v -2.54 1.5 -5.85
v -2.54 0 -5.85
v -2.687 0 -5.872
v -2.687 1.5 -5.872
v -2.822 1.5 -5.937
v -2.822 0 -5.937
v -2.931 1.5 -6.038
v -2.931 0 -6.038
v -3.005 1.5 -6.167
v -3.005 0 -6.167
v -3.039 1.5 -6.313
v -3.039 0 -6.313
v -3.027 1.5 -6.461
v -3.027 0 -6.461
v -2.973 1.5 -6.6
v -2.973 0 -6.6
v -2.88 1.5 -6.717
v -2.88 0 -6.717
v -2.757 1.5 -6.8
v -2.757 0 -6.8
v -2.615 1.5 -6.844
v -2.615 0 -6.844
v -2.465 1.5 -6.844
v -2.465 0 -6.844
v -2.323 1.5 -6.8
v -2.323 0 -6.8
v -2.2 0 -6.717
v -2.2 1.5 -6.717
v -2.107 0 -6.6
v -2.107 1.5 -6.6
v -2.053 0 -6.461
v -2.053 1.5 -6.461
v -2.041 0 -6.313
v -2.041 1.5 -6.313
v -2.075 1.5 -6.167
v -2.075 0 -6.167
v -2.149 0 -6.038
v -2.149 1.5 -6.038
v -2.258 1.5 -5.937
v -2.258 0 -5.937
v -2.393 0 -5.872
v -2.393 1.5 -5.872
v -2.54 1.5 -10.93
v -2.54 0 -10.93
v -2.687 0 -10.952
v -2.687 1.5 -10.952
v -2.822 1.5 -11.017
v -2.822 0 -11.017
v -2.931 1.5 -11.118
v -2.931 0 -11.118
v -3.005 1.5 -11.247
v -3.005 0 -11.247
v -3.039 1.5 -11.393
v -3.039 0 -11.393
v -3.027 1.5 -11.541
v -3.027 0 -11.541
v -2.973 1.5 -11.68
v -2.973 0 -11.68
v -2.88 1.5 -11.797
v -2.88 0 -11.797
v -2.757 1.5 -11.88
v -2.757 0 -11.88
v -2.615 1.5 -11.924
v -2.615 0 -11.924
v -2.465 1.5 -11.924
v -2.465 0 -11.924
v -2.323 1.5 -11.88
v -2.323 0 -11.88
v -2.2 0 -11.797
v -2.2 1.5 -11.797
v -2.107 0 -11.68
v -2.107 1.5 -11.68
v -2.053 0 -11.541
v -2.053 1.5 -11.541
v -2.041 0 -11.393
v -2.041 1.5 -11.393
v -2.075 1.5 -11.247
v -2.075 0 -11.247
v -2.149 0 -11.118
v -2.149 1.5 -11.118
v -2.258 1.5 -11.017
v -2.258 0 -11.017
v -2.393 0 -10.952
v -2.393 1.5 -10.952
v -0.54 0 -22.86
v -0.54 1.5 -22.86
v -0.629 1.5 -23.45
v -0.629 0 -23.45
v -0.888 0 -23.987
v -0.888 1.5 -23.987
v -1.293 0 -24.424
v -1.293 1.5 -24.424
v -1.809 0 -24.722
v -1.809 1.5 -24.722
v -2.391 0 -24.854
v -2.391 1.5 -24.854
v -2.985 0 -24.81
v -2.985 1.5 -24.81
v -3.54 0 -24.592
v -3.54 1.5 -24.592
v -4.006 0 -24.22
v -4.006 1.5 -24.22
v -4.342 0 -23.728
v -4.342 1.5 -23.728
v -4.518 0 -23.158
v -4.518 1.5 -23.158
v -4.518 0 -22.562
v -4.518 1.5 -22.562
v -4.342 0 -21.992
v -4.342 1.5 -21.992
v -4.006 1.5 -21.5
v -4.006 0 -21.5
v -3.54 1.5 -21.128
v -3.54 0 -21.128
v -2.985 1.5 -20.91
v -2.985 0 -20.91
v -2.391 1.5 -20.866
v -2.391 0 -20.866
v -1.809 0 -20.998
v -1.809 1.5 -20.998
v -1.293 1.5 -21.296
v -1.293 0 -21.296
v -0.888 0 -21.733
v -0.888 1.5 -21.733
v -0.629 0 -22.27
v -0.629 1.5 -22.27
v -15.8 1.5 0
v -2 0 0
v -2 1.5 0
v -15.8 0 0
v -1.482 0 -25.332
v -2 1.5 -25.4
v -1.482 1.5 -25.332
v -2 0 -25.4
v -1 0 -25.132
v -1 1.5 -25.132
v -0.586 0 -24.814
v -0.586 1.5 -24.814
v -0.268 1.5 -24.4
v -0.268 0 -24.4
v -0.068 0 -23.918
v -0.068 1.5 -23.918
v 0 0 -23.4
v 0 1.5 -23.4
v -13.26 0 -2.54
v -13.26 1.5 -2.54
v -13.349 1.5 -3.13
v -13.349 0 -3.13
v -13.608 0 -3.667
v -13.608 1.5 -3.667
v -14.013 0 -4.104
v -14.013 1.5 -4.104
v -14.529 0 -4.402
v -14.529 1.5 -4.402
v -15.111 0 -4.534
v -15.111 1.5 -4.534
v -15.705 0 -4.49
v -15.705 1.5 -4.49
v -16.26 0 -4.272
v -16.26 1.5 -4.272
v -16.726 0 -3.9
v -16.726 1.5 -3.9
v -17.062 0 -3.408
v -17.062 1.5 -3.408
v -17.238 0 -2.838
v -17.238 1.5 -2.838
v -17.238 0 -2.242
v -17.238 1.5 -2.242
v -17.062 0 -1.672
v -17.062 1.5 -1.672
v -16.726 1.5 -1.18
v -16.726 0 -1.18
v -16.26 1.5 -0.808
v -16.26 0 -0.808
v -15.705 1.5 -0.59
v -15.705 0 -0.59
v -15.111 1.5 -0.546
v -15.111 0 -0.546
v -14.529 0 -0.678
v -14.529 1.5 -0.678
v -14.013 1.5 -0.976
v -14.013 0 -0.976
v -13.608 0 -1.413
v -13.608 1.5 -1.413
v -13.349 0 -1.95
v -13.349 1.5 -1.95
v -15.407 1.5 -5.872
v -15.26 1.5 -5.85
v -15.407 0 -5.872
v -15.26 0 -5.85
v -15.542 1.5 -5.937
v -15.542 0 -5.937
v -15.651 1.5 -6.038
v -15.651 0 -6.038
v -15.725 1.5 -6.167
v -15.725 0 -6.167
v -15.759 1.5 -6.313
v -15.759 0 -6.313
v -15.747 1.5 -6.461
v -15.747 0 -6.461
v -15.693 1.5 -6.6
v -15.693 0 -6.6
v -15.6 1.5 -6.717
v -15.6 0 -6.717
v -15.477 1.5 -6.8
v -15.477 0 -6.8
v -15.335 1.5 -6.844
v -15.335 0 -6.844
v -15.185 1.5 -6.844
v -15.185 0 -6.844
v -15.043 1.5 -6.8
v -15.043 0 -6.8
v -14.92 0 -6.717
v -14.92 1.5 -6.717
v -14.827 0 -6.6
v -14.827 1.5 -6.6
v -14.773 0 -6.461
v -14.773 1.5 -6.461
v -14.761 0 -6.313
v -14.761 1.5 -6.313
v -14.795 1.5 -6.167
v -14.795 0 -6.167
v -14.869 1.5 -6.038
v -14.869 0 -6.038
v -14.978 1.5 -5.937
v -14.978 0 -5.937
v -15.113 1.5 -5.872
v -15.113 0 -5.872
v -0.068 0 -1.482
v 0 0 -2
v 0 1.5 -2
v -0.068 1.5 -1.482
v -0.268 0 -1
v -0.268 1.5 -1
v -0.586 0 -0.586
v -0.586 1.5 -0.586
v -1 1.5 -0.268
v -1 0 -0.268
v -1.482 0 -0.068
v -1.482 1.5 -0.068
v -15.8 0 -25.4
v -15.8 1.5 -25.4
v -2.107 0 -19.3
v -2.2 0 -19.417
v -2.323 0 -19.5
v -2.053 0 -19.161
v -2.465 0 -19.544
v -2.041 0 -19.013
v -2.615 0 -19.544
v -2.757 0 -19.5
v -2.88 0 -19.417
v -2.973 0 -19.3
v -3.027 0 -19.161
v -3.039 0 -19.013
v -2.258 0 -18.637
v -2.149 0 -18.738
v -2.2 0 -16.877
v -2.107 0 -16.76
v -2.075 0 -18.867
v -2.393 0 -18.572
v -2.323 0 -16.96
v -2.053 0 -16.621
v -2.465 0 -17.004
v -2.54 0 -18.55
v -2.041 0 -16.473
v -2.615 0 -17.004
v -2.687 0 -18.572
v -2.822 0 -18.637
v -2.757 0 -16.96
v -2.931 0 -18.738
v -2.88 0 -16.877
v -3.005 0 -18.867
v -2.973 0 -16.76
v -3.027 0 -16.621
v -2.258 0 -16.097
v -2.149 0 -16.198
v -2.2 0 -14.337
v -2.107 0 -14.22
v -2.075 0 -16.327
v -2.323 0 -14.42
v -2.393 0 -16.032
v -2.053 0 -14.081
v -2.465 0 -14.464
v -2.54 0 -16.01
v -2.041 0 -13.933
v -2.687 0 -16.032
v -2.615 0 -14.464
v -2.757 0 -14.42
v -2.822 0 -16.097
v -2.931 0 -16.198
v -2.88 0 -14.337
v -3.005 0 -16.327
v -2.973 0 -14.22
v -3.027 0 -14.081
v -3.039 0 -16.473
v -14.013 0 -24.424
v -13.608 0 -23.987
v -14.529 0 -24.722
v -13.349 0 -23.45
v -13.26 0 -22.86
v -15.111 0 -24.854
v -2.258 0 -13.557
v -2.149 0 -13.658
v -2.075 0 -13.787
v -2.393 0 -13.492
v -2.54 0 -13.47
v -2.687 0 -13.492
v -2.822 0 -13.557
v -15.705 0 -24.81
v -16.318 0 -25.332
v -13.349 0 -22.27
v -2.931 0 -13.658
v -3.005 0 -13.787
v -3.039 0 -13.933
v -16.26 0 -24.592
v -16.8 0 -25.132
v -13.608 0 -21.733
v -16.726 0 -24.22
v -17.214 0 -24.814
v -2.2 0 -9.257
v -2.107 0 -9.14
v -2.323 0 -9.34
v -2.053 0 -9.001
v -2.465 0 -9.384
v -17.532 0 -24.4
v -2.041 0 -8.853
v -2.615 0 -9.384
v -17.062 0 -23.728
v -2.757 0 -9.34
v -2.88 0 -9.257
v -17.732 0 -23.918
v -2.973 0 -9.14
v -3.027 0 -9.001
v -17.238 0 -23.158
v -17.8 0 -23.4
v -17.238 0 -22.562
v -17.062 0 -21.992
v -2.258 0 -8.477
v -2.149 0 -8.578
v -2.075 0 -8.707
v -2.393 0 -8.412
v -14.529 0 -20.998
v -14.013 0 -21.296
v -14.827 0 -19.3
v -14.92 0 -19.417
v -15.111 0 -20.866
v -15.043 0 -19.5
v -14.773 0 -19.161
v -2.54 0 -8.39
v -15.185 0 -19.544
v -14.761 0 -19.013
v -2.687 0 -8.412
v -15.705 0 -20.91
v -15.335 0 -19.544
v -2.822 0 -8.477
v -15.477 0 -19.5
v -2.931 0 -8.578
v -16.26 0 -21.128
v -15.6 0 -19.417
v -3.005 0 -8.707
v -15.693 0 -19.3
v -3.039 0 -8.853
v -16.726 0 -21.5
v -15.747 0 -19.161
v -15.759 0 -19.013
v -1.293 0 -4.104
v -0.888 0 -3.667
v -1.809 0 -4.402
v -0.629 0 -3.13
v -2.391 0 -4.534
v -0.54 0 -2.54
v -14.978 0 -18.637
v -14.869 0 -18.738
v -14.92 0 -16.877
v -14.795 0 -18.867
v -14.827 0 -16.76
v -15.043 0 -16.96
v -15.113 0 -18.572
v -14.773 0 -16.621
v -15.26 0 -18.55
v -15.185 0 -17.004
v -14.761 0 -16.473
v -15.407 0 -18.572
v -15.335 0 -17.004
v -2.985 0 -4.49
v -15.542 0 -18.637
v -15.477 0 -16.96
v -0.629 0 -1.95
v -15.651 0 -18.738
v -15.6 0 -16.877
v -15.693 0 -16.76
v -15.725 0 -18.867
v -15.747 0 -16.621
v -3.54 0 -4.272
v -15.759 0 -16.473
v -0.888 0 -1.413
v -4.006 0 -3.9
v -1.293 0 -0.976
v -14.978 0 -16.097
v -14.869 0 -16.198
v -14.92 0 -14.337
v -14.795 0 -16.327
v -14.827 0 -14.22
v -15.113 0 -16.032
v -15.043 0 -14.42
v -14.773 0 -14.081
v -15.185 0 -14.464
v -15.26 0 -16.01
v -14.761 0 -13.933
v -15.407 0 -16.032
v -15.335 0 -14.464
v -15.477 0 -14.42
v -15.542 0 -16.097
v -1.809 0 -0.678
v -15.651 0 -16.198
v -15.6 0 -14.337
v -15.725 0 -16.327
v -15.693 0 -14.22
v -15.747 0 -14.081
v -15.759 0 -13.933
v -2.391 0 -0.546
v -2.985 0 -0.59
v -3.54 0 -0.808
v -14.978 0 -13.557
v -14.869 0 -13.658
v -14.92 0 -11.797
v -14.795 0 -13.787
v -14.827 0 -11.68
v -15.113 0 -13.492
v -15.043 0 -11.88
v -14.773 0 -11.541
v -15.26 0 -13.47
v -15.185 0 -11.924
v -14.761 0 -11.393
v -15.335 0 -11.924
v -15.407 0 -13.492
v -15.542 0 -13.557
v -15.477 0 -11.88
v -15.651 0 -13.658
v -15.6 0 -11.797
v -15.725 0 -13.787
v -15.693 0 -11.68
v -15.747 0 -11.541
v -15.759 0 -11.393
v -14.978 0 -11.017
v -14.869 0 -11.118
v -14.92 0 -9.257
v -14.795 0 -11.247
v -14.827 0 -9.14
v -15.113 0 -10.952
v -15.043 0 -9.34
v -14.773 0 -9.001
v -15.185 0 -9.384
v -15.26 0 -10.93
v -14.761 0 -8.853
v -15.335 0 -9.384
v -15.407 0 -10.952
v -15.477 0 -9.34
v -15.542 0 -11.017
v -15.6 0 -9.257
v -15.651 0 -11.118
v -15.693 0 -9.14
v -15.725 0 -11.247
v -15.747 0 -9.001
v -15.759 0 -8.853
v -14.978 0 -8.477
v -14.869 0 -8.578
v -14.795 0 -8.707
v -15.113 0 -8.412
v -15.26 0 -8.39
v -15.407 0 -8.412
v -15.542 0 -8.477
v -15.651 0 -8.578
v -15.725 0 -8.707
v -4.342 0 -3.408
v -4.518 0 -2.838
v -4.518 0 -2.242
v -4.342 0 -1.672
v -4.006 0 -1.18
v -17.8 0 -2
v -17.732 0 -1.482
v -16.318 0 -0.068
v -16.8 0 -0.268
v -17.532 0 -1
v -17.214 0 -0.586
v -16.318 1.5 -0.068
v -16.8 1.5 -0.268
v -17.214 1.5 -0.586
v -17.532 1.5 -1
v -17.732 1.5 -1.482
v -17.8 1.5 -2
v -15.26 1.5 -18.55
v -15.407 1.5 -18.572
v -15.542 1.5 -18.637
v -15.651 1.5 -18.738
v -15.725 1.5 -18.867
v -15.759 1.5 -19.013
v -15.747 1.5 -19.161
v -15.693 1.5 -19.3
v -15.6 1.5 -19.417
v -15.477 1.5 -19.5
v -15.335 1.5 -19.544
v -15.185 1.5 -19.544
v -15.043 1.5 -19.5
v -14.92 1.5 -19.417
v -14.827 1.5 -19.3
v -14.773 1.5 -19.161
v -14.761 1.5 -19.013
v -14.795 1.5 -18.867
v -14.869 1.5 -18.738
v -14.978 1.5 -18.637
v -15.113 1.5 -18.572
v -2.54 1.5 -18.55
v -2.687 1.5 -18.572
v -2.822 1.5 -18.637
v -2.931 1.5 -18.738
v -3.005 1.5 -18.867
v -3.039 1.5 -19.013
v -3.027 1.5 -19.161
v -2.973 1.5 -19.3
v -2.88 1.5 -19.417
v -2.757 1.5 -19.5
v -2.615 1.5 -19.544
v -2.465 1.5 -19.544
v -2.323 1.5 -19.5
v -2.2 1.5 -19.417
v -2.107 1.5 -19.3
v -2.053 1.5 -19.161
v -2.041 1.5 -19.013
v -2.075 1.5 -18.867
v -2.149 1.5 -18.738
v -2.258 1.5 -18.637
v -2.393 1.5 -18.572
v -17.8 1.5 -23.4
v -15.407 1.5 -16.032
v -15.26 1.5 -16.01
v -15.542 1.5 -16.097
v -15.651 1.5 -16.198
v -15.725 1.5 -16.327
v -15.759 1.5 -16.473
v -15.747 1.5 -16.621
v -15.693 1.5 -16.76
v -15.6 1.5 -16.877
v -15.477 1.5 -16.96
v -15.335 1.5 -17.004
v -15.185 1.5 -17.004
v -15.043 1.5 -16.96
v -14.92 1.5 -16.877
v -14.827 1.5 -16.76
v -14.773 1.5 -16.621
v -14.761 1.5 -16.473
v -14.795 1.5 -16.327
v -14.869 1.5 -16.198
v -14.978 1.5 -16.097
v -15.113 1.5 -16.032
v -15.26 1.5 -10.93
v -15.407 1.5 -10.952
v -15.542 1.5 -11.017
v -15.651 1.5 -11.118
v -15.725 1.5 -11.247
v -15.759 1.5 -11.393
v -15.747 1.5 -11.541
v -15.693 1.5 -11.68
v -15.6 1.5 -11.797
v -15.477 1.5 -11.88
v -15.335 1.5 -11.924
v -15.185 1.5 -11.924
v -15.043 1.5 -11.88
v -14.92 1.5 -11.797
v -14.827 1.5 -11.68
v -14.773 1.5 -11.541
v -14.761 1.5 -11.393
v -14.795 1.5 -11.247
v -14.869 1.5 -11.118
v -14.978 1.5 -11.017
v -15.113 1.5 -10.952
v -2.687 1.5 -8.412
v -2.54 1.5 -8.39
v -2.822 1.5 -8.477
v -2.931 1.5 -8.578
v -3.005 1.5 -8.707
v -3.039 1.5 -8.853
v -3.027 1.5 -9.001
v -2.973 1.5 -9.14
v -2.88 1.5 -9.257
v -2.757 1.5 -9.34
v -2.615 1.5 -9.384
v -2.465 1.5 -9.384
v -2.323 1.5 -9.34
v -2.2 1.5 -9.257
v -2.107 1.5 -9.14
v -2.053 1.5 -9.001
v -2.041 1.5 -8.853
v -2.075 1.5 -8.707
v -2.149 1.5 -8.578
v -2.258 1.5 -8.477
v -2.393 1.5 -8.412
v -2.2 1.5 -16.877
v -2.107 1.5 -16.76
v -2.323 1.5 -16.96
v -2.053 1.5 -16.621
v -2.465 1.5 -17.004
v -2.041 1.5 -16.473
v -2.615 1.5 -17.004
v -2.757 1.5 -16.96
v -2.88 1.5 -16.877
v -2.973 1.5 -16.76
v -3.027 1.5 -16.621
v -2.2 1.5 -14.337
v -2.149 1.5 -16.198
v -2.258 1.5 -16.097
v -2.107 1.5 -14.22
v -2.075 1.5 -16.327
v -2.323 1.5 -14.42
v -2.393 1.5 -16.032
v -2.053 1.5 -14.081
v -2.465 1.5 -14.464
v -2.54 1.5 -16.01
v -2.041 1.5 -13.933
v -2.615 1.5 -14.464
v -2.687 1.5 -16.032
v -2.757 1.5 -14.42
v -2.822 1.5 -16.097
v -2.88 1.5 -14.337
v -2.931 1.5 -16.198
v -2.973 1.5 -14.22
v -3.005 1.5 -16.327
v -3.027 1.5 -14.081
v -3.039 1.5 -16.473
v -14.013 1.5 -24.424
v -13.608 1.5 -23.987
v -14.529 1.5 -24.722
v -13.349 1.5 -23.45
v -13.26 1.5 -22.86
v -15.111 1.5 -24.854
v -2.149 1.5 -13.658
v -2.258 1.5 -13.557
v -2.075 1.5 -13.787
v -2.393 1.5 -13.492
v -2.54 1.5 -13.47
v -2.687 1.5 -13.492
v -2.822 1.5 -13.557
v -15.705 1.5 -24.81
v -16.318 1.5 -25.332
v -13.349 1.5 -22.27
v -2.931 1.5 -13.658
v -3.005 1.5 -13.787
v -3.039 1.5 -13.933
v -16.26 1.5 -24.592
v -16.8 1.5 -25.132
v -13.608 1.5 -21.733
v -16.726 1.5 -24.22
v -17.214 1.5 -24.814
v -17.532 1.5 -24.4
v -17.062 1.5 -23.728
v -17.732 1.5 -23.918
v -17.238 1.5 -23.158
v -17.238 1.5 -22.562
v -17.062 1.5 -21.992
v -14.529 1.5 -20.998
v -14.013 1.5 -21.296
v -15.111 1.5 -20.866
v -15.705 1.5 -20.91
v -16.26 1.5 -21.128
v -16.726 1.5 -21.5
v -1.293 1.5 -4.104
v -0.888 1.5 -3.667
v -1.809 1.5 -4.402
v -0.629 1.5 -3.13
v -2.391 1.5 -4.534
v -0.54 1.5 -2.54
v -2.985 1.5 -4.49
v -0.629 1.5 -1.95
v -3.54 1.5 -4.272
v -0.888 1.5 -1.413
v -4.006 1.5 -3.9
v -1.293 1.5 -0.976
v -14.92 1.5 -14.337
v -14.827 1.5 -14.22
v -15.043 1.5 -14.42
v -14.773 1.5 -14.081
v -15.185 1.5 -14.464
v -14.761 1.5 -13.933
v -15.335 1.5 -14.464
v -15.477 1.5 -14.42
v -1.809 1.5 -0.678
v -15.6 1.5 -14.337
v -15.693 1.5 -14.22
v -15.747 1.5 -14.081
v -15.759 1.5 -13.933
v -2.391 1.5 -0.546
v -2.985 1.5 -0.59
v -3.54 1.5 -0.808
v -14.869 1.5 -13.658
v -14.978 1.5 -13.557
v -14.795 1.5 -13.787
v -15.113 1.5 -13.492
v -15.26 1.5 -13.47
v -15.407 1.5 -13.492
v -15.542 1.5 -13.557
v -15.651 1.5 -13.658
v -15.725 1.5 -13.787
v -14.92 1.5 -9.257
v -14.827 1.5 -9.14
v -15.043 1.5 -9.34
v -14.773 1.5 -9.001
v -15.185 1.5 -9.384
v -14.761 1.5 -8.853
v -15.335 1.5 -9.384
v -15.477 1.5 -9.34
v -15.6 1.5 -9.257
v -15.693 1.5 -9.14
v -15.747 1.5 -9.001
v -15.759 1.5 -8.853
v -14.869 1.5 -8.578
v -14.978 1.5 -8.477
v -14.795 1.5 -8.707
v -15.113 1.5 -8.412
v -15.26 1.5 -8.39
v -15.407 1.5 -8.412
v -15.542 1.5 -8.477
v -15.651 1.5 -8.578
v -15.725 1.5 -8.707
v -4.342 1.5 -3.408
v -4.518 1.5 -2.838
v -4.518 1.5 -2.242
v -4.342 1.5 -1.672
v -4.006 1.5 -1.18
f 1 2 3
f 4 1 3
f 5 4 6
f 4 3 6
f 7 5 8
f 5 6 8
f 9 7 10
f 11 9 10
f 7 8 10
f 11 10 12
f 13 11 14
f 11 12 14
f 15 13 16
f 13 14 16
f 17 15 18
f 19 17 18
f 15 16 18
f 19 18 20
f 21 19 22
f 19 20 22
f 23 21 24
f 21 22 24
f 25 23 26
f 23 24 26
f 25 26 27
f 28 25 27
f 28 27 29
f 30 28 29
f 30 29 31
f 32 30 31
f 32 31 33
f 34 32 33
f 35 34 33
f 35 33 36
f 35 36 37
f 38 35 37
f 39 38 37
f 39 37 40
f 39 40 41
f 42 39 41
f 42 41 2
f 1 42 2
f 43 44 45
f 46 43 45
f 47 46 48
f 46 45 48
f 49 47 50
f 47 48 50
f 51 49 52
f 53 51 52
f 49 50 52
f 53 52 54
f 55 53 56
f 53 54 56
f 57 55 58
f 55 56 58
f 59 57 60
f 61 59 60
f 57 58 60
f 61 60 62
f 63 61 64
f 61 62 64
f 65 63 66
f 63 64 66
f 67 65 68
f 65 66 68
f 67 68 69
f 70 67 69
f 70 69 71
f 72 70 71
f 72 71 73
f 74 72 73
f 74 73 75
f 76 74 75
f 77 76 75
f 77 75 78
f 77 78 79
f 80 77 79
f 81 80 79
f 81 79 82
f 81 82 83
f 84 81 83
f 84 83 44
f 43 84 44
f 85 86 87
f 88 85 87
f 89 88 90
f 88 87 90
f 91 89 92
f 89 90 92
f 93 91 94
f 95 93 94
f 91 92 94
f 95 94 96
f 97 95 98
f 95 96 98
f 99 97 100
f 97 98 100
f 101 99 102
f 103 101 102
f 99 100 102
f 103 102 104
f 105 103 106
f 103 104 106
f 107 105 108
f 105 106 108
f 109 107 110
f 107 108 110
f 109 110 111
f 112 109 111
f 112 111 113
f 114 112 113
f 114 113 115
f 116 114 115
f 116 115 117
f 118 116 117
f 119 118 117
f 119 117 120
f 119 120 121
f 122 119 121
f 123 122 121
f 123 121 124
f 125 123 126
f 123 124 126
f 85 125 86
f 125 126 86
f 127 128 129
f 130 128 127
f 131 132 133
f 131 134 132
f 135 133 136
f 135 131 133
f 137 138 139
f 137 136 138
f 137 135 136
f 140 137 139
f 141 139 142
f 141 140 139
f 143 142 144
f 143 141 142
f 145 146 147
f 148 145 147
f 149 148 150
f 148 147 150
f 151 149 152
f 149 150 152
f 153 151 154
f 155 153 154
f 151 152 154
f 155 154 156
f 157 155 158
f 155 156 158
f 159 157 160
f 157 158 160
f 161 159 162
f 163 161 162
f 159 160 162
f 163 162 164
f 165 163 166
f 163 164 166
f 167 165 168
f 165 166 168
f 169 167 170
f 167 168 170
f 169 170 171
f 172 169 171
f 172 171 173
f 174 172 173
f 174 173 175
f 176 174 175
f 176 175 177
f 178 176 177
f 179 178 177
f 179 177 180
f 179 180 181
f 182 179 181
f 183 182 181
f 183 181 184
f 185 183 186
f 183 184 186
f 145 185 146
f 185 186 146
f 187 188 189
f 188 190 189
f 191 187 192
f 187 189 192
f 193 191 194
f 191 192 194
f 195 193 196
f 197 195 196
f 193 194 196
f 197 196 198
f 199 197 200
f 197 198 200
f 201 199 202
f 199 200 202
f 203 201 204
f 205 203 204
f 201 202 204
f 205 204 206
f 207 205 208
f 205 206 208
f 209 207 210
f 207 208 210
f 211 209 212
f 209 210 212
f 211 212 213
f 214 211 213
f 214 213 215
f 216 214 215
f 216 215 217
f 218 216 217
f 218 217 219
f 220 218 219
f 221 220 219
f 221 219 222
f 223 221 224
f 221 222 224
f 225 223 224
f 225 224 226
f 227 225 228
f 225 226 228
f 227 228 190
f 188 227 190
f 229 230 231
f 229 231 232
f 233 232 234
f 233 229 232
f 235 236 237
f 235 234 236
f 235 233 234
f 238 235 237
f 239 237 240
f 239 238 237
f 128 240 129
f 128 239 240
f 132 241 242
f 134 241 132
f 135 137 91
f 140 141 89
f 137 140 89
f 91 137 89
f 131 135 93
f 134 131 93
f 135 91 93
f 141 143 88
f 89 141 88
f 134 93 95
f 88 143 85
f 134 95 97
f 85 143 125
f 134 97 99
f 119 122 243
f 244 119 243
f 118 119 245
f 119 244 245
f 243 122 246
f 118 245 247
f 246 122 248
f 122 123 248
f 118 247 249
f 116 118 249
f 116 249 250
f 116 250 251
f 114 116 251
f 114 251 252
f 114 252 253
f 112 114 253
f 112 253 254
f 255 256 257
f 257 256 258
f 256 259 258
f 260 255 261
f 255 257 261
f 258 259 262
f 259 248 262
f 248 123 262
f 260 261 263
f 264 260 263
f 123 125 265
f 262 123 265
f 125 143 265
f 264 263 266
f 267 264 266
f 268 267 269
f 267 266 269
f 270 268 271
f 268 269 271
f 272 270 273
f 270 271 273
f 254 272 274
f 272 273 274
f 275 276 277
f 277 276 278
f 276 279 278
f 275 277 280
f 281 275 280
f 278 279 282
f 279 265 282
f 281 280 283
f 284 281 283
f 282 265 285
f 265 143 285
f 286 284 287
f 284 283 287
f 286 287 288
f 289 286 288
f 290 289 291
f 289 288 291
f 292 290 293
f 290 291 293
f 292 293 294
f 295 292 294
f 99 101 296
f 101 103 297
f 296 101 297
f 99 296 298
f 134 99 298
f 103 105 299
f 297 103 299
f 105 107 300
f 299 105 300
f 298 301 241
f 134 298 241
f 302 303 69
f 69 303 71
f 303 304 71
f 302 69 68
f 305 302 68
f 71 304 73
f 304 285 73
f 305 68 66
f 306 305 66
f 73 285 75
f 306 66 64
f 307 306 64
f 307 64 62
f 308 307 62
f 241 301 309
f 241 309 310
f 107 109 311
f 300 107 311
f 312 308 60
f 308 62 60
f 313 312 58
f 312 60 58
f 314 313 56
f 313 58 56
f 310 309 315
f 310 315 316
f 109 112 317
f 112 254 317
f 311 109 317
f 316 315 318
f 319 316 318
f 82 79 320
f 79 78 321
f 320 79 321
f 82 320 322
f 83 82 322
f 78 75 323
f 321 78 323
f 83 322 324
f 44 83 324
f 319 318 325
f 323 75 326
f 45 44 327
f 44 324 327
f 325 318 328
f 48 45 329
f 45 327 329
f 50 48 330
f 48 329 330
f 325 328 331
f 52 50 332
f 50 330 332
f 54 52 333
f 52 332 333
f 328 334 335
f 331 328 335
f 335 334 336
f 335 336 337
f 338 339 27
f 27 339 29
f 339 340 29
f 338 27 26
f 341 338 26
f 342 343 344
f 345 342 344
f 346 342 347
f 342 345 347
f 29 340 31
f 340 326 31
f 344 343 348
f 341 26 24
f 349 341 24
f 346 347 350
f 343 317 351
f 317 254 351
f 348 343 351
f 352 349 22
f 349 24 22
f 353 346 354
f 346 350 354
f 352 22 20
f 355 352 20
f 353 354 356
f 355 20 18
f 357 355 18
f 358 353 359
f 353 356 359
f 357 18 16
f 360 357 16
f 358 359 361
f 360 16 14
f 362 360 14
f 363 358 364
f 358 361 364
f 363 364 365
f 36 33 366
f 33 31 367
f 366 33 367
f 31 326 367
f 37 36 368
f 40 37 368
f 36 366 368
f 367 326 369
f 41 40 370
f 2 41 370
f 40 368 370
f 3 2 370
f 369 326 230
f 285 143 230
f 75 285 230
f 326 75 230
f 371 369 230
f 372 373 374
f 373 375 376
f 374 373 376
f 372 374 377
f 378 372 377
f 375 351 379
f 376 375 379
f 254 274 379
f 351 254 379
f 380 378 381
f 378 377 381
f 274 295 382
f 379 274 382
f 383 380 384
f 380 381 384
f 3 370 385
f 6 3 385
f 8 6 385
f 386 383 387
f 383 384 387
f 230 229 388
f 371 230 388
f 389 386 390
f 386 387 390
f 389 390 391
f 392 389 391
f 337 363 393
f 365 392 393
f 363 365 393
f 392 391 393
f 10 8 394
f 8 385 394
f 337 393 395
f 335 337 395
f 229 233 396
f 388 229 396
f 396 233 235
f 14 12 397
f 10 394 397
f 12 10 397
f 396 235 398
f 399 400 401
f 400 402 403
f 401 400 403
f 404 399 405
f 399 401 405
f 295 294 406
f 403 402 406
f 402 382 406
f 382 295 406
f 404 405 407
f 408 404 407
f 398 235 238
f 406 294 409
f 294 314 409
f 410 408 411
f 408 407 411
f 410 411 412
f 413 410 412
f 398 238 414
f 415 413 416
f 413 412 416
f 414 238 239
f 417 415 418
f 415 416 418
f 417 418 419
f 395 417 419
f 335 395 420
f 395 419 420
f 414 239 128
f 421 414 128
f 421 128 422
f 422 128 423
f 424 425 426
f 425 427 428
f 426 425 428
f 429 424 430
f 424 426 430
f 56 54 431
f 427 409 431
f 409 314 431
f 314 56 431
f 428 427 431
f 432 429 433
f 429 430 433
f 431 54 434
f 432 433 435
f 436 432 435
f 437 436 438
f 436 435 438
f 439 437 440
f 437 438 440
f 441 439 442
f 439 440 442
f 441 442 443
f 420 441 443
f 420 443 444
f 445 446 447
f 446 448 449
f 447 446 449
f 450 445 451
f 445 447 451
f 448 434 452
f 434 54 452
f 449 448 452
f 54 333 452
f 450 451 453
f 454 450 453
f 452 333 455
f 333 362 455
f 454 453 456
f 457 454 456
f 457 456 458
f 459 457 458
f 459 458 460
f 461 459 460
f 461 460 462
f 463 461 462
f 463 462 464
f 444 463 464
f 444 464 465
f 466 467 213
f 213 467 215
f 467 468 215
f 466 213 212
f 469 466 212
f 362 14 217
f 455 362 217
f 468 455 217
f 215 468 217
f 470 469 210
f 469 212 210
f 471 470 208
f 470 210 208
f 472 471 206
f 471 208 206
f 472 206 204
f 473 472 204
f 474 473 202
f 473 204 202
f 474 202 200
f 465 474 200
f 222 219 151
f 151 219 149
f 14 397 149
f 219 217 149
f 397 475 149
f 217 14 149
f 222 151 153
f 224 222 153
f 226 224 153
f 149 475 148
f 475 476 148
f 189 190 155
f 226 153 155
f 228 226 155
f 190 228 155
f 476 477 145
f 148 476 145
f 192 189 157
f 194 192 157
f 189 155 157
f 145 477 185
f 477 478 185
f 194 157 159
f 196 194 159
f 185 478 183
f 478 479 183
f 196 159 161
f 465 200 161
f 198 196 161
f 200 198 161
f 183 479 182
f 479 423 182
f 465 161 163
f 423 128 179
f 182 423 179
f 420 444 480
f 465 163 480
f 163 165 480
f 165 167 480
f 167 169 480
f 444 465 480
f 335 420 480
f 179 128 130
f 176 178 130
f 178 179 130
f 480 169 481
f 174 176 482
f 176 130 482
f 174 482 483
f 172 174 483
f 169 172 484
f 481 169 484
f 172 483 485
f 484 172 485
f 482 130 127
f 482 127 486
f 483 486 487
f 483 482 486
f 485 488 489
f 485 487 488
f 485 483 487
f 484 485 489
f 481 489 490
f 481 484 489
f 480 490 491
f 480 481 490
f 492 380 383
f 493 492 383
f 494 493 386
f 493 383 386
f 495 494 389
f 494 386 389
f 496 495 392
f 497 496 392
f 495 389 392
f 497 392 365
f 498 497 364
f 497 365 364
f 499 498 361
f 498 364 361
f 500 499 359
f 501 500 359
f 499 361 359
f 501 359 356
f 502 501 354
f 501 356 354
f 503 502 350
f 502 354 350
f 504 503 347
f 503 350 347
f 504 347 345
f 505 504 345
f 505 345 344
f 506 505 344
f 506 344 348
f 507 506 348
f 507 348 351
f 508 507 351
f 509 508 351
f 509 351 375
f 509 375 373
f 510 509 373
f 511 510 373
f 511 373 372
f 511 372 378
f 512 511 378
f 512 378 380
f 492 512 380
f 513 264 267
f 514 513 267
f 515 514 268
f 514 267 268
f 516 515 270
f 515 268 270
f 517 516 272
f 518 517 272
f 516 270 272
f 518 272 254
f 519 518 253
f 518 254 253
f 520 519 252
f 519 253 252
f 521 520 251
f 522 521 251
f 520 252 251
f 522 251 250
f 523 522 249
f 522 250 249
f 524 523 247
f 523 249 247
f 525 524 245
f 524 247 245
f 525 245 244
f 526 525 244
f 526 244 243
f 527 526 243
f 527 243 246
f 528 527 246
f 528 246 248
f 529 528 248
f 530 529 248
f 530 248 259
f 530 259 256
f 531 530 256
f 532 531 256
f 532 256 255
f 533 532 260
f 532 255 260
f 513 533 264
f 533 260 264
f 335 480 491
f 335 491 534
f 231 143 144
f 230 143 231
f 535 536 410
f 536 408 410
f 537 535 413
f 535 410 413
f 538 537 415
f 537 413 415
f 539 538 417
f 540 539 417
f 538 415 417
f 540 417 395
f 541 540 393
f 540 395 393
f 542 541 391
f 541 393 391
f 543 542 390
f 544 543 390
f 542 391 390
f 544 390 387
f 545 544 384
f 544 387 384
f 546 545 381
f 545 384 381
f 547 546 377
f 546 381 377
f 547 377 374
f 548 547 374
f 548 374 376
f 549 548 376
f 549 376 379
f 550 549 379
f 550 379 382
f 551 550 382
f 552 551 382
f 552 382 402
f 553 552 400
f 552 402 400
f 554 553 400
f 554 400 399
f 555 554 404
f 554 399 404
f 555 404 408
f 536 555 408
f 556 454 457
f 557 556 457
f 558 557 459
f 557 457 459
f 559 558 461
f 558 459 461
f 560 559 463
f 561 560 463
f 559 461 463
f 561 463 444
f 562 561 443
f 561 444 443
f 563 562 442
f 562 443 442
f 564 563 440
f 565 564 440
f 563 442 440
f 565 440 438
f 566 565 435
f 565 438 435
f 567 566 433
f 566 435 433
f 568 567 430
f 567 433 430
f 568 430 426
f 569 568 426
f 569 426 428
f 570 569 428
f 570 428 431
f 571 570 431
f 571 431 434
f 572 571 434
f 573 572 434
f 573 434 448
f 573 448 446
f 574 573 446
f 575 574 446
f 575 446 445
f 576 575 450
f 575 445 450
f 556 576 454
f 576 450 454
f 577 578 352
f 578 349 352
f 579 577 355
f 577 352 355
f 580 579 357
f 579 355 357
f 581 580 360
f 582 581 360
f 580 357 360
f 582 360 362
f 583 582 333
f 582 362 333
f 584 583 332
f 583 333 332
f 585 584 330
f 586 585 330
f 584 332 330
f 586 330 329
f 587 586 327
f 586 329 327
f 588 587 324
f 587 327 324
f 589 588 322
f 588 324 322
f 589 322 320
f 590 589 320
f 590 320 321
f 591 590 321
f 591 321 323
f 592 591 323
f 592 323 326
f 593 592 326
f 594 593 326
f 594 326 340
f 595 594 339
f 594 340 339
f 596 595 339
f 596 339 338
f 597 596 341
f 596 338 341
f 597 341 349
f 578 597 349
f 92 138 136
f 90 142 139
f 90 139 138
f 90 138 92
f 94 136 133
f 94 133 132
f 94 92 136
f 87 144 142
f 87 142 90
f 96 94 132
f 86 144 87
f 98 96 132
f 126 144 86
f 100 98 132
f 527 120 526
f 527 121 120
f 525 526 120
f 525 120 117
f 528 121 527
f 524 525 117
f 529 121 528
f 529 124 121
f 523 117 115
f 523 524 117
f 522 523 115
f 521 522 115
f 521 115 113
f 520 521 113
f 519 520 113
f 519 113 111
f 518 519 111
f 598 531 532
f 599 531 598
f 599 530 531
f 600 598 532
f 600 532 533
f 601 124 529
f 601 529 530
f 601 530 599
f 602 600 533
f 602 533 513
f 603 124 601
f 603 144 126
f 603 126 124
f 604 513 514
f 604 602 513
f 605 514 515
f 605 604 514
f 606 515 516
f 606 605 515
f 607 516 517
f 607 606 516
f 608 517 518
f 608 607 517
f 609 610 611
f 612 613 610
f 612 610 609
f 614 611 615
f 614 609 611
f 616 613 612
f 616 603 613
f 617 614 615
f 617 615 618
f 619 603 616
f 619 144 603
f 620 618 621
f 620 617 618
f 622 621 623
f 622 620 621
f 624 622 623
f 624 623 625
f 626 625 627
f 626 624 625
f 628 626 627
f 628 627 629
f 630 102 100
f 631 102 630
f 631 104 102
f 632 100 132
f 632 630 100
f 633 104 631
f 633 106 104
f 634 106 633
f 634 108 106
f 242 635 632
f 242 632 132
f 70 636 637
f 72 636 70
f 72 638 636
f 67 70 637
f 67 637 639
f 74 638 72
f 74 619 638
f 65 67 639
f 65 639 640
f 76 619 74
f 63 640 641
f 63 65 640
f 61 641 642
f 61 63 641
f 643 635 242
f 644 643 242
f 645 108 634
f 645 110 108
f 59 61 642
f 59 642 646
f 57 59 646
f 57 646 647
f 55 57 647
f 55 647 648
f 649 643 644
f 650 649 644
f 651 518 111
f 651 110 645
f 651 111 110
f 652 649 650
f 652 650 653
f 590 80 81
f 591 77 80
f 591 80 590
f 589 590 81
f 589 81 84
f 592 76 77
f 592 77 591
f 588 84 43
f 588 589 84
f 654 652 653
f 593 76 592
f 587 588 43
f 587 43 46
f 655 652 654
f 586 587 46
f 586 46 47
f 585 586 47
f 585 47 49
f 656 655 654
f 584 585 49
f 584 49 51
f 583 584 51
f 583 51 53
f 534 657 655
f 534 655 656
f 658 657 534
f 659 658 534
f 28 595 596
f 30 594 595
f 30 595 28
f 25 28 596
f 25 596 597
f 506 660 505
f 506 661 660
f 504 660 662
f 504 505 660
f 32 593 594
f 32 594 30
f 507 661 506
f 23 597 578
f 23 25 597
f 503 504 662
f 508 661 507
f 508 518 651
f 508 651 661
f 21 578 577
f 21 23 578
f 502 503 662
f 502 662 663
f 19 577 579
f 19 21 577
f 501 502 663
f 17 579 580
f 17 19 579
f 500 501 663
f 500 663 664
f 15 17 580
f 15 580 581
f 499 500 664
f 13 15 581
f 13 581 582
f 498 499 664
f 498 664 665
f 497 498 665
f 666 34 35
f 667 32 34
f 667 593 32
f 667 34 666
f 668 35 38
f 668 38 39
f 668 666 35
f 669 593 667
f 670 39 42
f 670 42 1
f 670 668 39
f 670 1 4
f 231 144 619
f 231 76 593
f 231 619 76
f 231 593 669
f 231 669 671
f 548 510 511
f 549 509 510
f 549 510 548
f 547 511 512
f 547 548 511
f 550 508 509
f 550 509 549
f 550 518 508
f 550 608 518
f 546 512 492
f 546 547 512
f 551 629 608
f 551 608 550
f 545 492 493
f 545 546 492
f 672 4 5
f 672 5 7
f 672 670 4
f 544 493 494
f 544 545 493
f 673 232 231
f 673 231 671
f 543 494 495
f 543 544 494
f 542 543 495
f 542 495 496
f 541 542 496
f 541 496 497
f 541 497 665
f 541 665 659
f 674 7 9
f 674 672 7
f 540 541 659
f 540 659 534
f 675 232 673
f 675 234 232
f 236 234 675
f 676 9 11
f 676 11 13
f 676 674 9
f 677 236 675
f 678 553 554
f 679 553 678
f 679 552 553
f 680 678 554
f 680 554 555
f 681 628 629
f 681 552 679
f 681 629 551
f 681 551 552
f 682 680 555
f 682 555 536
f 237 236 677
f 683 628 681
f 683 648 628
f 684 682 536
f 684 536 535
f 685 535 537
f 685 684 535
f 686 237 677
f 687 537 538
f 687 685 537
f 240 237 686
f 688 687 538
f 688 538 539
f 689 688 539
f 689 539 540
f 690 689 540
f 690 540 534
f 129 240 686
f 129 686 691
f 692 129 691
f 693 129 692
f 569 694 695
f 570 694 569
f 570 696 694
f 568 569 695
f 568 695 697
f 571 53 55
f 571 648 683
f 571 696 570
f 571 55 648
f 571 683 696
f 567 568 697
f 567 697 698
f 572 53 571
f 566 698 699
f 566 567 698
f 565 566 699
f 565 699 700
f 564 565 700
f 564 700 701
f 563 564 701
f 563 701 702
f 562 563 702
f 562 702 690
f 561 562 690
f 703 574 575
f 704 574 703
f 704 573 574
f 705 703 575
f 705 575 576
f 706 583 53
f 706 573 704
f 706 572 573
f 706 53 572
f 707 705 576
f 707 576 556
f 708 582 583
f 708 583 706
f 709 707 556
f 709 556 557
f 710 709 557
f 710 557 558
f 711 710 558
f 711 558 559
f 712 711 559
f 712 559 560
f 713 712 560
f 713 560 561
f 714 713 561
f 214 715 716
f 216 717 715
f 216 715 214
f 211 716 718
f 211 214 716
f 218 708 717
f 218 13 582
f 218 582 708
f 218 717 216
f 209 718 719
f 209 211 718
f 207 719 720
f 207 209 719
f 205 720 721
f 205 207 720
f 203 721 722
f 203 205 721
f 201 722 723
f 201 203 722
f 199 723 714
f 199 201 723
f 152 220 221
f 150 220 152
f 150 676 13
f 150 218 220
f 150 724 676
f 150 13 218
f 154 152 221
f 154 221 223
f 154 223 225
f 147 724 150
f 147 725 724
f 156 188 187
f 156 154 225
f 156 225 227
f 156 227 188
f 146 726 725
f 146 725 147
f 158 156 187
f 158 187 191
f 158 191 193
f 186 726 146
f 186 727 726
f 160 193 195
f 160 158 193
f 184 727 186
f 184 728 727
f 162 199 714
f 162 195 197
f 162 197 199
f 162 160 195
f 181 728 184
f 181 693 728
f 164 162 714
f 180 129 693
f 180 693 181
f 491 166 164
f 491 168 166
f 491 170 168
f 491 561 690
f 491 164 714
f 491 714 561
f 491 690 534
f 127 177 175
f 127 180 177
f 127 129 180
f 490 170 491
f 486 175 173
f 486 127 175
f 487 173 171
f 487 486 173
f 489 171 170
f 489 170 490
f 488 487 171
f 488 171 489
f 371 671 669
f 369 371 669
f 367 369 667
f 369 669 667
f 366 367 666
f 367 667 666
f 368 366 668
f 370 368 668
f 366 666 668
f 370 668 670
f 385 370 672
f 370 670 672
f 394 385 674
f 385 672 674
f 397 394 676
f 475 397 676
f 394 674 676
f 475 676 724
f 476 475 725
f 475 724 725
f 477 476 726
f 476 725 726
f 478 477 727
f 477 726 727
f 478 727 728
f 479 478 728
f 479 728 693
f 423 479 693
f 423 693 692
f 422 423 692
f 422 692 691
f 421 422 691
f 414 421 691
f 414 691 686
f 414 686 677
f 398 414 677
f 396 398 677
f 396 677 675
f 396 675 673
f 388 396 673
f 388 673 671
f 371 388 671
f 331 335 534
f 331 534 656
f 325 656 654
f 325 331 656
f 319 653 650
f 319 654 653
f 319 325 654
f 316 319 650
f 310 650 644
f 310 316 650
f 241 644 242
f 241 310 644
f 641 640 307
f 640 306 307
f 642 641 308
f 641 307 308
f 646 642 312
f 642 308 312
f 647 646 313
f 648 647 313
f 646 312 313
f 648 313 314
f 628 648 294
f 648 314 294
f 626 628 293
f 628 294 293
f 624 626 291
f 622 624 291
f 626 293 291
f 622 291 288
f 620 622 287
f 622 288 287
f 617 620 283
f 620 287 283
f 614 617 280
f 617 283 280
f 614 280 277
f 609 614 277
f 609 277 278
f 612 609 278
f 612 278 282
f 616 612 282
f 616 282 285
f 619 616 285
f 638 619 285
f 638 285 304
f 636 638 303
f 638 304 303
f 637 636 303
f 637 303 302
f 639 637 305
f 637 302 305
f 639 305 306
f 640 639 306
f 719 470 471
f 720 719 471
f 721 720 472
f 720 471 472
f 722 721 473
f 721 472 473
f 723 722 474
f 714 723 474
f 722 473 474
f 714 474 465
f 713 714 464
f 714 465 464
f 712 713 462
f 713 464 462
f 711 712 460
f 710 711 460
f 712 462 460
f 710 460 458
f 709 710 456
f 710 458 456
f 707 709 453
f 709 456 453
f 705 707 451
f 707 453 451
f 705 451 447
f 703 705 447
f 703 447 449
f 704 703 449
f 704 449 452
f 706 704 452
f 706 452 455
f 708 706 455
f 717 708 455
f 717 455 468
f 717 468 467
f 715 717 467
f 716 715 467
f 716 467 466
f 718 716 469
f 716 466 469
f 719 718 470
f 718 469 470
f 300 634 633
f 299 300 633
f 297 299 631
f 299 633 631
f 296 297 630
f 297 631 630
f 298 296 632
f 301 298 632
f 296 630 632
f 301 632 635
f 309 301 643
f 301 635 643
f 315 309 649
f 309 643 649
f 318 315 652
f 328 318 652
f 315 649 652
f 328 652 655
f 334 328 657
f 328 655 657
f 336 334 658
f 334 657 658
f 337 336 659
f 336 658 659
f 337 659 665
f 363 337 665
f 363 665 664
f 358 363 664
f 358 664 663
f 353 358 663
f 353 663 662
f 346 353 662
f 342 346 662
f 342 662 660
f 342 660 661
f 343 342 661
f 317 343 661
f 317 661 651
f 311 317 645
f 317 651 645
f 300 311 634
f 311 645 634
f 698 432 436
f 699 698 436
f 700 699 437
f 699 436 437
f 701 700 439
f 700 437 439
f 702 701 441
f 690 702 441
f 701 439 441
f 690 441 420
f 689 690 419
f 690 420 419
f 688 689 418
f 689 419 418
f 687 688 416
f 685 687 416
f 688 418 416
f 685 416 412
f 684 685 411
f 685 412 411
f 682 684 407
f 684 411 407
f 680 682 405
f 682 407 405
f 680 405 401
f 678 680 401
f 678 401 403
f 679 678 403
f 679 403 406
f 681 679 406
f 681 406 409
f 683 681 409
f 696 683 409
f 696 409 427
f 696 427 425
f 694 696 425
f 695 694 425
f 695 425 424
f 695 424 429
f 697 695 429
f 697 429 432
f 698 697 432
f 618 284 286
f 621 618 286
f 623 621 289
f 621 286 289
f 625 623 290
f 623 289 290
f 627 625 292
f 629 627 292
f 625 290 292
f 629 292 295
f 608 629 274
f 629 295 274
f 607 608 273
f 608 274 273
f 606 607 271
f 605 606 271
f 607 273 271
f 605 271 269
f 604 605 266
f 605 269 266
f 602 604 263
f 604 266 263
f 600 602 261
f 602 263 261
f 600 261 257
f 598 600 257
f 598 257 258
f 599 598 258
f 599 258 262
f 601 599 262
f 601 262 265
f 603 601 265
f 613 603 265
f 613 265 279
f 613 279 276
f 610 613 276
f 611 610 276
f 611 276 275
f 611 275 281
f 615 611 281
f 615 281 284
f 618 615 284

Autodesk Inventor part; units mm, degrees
ref_plane "YZ Plane" through (0, 0, 0) normal (1, 0, 0) x (0, 1, 0)
ref_plane "XZ Plane" through (0, 0, 0) normal (0, 1, 0) x (-1, 0, 0)
ref_plane "XY Plane" through (0, 0, 0) normal (0, 0, 1) x (1, 0, 0)
sketch "Szkic1" plane through (0, 0, 0) normal (0, 1, 0) x (-1, 0, 0)
  line L0 (2, 0) -> (15.8, 0)
  line L1 (17.8, -2) -> (17.8, -23.4)
  line L2 (15.8, -25.4) -> (2, -25.4)
  line L3 (0, -23.4) -> (0, -2)
  arc A0 (17.8, -2) -> (15.8, 0) centre (15.8, -2) ccw
  arc A1 (15.8, -25.4) -> (17.8, -23.4) centre (15.8, -23.4) ccw
  arc A2 (0, -23.4) -> (2, -25.4) centre (2, -23.4) ccw
  arc A3 (2, 0) -> (0, -2) centre (2, -2) ccw
  point P0 (0, 0)
  point P1 (17.8, -25.4)
  point P2 (17.8, 0)
  point P3 (0, -25.4)
  dimension "d0" = 17.8
  dimension "d1" = 25.4
  dimension "d2" = 2
extrude "Wyciągnięcie proste1" add sketch "Szkic1" along normal blind 1.5
sketch "Szkic2" plane through (0, 1.5, 0) normal (0, 1, 0) x (1, 0, 0)
  line L0 (-2, 25.4) -> (-15.8, 25.4) projected
  line L1 (-17.8, 23.4) -> (-17.8, 2) projected
  line L2 (0, 2) -> (0, 23.4) projected
  point P0 (0, 0)
  point P1 (-2.54, 6.35)
  point P2 (-2.54, 8.89)
  point P3 (-2.54, 11.43)
  point P4 (-2.54, 13.97)
  point P5 (-15.26, 6.35)
  point P6 (-15.26, 8.89)
  point P7 (-15.26, 11.43)
  point P8 (-15.26, 13.97)
  point P9 (-15.26, 16.51)
  point P10 (-15.26, 19.05)
  point P11 (-2.54, 16.51)
  point P12 (-2.54, 19.05)
  dimension "d8" = 2.54
  dimension "d9" = 2.54
  dimension "d10" = 2.54
  dimension "d11" = 2.54
  dimension "d12" = 2.54
  dimension "d13" = 6.35
  dimension "d14" = 2.54
  dimension "d15" = 2.54
  dimension "d16" = 2.54
  dimension "d17" = 2.54
  dimension "d19" = 2.54
hole "Otwór1" at (-2.54, 1.5, -6.35) at (-2.54, 1.5, -8.89) at (-2.54, 1.5, -11.43) at (-2.54, 1.5, -13.97) at (-15.26, 1.5, -6.35) at (-15.26, 1.5, -8.89) at (-15.26, 1.5, -11.43) at (-15.26, 1.5, -13.97) at (-15.26, 1.5, -16.51) at (-15.26, 1.5, -19.05) at (-2.54, 1.5, -16.51) at (-2.54, 1.5, -19.05) direction (0, -1, 0) diameter 1 end through all
sketch "Szkic3" plane through (0, 1.5, 0) normal (0, 1, 0) x (1, 0, 0)
  point P0 (0, 0)
sketch "Szkic4" plane through (0, 1.5, 0) normal (0, 1, 0) x (1, 0, 0)
  circle A0 centre (-2.54, 13.97) radius 0.5 construction
  circle A1 centre (-2.54, 7.62) radius 0.5 construction
  line L0 (-2.54, 13.97) -> (-2.54, 7.62) construction
  line L1 (-2.54, 13.97) -> (-2.54, -5.3346) construction
  circle A2 centre (-2.54, 8.89) radius 0.5 construction
  line L2 (-2.54, 8.89) -> (-2.54, 22.9895) construction
  circle A3 centre (-2.54, 22.86) radius 2
  line L3 (-2, 25.4) -> (-15.8, 25.4) projected
  circle A4 centre (-2.54, 2.54) radius 2
  line L4 (-15.8, 0) -> (-2, 0) projected
  circle A5 centre (-15.26, 2.54) radius 2
  circle A6 centre (-15.26, 22.86) radius 2
  line L5 (-17.8, 23.4) -> (-17.8, 2) projected
  point P0 (0, 0)
  dimension "d27" = 4
  dimension "d28" = 2.54
  dimension "d29" = 4
  dimension "d30" = 2.54
  dimension "d33" = 4
  dimension "d34" = 4
  dimension "d35" = 2.54
extrude "Wyciągnięcie proste2" cut sketch "Szkic4" against normal blind 10
equation "\"d8\" = d7"
equation "\"d9\" = d8"
equation "\"d10\" = d9"
equation "\"d11\" = d10"
equation "\"d12\" = d11"
equation "\"d13\" = 2.5 * d12"
equation "\"d14\" = d8"
equation "\"d16\" = d15"
equation "\"d17\" = d16"
equation "\"d6\" = d5"
equation "\"d7\" = d6"
equation "\"d5\" = 2.54"
properties part number "Adafruit_IMU"
